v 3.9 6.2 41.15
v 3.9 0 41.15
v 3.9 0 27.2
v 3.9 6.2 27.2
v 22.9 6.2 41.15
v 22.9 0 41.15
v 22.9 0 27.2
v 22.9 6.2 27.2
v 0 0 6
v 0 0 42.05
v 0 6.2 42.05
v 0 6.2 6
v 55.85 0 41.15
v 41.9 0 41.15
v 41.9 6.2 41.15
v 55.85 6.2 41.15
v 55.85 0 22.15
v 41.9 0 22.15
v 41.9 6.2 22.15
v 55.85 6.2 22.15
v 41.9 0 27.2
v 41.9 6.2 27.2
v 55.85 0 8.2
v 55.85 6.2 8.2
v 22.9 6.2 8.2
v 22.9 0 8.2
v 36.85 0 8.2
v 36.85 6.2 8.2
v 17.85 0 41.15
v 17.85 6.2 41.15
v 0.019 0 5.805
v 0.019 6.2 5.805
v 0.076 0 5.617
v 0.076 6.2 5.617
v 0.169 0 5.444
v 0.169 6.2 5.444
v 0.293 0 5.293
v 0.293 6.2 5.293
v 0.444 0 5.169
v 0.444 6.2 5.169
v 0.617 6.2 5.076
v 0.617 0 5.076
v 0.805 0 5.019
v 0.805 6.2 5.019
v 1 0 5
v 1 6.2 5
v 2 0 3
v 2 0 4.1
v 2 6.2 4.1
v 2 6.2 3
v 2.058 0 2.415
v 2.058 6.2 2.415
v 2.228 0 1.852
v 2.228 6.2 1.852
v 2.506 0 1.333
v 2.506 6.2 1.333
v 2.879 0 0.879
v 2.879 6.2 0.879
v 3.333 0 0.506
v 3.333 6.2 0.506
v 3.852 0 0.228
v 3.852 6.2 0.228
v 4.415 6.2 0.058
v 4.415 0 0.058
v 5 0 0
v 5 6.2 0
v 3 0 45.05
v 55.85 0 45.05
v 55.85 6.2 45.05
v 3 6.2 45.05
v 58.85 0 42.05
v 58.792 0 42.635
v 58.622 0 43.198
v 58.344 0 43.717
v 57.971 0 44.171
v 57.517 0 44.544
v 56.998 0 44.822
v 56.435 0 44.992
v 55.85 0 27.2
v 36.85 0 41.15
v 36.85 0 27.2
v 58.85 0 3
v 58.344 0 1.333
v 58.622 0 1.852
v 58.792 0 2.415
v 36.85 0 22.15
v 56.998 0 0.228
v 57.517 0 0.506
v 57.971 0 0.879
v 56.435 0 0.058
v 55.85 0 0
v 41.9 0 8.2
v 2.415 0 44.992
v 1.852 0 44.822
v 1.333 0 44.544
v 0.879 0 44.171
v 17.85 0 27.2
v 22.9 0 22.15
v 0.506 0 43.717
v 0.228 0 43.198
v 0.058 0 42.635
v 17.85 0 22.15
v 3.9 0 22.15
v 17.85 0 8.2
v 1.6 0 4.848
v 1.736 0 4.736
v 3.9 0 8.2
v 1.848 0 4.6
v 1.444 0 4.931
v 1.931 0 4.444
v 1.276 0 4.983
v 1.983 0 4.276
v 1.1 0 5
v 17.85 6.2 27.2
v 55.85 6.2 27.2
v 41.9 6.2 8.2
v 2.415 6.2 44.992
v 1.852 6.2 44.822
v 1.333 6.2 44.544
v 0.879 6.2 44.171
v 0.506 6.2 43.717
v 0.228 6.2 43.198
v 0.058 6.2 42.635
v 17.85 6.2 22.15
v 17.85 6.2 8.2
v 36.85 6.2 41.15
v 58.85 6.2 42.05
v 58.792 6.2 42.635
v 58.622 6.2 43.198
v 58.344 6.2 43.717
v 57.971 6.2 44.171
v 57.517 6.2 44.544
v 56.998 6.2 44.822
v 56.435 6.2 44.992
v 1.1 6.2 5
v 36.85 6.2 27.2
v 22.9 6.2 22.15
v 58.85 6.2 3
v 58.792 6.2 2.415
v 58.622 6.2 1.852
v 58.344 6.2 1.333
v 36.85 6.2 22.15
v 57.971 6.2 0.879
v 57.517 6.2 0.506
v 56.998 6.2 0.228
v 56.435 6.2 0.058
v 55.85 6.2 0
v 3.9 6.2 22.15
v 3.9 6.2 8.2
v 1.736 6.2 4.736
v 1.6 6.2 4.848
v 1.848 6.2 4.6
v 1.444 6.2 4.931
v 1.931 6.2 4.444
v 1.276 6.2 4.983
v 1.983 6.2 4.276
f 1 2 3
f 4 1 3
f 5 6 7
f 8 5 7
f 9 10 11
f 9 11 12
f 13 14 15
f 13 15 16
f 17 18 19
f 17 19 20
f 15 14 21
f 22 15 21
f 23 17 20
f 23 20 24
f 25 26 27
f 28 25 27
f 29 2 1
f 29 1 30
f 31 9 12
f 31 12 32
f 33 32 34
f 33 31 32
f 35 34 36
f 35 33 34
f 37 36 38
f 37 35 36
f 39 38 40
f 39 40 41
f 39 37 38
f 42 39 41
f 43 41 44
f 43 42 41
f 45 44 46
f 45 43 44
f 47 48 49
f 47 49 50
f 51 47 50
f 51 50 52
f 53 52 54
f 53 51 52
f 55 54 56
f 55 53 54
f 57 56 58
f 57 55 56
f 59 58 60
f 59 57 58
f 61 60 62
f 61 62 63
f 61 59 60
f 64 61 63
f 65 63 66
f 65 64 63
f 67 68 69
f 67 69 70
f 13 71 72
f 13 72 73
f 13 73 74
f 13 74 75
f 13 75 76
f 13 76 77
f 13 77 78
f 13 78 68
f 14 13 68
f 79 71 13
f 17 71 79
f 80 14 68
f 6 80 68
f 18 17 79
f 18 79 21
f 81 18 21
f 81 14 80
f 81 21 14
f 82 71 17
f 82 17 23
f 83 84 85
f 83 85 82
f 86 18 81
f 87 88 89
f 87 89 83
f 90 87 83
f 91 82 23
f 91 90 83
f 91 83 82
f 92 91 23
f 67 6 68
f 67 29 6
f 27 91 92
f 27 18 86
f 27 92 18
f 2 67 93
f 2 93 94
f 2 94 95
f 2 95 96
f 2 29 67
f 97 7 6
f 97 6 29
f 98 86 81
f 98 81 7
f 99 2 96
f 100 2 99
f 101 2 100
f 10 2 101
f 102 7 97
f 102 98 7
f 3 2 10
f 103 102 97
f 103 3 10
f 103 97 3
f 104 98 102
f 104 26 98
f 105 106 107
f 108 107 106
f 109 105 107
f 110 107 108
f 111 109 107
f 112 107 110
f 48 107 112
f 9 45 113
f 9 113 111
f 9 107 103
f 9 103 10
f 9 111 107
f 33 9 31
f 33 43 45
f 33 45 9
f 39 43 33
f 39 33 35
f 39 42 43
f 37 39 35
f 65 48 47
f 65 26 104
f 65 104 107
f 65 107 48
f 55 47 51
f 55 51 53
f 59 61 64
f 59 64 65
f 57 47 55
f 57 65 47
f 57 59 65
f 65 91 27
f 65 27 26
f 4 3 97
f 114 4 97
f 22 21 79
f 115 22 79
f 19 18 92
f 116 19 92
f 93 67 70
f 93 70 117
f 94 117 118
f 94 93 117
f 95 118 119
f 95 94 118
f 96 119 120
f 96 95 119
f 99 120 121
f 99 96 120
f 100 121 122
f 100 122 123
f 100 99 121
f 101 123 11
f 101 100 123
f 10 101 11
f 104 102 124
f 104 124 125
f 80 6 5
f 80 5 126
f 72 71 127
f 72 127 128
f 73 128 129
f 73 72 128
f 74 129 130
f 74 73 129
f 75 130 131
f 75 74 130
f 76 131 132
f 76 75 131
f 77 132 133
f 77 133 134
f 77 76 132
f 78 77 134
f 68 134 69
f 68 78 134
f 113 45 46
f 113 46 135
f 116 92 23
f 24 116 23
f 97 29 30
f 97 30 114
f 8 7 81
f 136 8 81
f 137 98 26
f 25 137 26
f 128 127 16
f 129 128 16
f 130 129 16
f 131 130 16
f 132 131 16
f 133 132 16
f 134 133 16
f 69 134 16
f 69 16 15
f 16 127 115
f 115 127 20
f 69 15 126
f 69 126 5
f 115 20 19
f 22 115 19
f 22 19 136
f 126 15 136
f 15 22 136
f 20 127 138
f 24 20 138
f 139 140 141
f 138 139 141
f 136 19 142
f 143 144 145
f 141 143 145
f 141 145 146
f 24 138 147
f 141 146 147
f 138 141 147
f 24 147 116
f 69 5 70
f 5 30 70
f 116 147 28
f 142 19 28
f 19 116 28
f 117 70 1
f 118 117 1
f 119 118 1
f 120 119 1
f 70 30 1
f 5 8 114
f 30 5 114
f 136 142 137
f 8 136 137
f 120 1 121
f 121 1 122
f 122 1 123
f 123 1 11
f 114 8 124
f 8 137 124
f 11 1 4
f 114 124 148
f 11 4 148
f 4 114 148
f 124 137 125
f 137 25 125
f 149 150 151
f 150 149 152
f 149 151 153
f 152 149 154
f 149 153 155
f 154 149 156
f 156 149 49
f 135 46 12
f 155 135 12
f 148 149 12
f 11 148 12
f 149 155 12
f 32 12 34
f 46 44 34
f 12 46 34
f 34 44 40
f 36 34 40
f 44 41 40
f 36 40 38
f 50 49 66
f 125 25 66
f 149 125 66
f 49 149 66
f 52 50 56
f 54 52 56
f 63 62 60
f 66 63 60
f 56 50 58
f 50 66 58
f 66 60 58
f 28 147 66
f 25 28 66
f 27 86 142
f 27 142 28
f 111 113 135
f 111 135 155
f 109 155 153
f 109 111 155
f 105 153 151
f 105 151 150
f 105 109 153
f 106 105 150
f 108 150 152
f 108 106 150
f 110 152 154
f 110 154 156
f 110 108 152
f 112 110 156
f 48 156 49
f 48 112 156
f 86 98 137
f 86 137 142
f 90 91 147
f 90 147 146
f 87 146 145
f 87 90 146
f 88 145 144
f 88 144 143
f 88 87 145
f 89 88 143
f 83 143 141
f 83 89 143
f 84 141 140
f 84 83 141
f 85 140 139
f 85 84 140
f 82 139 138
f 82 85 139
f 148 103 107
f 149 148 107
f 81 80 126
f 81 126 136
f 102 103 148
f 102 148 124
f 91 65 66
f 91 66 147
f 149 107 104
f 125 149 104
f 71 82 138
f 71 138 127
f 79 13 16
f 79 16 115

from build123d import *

# Parameters (mm, degrees)
SKETCH1_W           = 13.95
SKETCH1_H           = 13.95
BOSS_EXTRUDE1_DEPTH = 6.2


with BuildPart() as part:
    # Sketch1 → Boss-Extrude1 (new body)
    with BuildSketch(Plane(origin=(0, 0, 0), x_dir=(1, 0, 0), z_dir=(0, 1, 0))):
        with BuildLine():
            Line((5, 0), (55.85, 0))
            ThreePointArc((55.85, 0), (57.971320344, -0.878679656), (58.85, -3))
            Line((58.85, -3), (58.85, -42.05))
            ThreePointArc((58.85, -42.05), (57.971320344, -44.171320344), (55.85, -45.05))
            Line((55.85, -45.05), (3, -45.05))
            ThreePointArc((3, -45.05), (0.878679656, -44.171320344), (0, -42.05))
            Line((0, -42.05), (0, -6))
            ThreePointArc((0, -6), (0.292893219, -5.292893219), (1, -5))
            Line((1, -5), (1.1, -5))
            ThreePointArc((1.1, -5), (1.736396103, -4.736396103), (2, -4.1))
            Line((2, -4.1), (2, -3))
            ThreePointArc((2, -3), (2.878679656, -0.878679656), (5, 0))
        make_face()
        with Locations((29.875, -15.175)):
            Rectangle(SKETCH1_W, SKETCH1_H, mode=Mode.SUBTRACT)
        with Locations((10.875, -15.175)):
            Rectangle(SKETCH1_W, SKETCH1_H, mode=Mode.SUBTRACT)
        with Locations((48.875, -15.175)):
            Rectangle(SKETCH1_W, SKETCH1_H, mode=Mode.SUBTRACT)
        with Locations((29.875, -34.175)):
            Rectangle(SKETCH1_W, SKETCH1_H, mode=Mode.SUBTRACT)
        with Locations((48.875, -34.175)):
            Rectangle(SKETCH1_W, SKETCH1_H, mode=Mode.SUBTRACT)
        with Locations((10.875, -34.175)):
            Rectangle(SKETCH1_W, SKETCH1_H, mode=Mode.SUBTRACT)
    extrude(amount=BOSS_EXTRUDE1_DEPTH)


solid = part.part
